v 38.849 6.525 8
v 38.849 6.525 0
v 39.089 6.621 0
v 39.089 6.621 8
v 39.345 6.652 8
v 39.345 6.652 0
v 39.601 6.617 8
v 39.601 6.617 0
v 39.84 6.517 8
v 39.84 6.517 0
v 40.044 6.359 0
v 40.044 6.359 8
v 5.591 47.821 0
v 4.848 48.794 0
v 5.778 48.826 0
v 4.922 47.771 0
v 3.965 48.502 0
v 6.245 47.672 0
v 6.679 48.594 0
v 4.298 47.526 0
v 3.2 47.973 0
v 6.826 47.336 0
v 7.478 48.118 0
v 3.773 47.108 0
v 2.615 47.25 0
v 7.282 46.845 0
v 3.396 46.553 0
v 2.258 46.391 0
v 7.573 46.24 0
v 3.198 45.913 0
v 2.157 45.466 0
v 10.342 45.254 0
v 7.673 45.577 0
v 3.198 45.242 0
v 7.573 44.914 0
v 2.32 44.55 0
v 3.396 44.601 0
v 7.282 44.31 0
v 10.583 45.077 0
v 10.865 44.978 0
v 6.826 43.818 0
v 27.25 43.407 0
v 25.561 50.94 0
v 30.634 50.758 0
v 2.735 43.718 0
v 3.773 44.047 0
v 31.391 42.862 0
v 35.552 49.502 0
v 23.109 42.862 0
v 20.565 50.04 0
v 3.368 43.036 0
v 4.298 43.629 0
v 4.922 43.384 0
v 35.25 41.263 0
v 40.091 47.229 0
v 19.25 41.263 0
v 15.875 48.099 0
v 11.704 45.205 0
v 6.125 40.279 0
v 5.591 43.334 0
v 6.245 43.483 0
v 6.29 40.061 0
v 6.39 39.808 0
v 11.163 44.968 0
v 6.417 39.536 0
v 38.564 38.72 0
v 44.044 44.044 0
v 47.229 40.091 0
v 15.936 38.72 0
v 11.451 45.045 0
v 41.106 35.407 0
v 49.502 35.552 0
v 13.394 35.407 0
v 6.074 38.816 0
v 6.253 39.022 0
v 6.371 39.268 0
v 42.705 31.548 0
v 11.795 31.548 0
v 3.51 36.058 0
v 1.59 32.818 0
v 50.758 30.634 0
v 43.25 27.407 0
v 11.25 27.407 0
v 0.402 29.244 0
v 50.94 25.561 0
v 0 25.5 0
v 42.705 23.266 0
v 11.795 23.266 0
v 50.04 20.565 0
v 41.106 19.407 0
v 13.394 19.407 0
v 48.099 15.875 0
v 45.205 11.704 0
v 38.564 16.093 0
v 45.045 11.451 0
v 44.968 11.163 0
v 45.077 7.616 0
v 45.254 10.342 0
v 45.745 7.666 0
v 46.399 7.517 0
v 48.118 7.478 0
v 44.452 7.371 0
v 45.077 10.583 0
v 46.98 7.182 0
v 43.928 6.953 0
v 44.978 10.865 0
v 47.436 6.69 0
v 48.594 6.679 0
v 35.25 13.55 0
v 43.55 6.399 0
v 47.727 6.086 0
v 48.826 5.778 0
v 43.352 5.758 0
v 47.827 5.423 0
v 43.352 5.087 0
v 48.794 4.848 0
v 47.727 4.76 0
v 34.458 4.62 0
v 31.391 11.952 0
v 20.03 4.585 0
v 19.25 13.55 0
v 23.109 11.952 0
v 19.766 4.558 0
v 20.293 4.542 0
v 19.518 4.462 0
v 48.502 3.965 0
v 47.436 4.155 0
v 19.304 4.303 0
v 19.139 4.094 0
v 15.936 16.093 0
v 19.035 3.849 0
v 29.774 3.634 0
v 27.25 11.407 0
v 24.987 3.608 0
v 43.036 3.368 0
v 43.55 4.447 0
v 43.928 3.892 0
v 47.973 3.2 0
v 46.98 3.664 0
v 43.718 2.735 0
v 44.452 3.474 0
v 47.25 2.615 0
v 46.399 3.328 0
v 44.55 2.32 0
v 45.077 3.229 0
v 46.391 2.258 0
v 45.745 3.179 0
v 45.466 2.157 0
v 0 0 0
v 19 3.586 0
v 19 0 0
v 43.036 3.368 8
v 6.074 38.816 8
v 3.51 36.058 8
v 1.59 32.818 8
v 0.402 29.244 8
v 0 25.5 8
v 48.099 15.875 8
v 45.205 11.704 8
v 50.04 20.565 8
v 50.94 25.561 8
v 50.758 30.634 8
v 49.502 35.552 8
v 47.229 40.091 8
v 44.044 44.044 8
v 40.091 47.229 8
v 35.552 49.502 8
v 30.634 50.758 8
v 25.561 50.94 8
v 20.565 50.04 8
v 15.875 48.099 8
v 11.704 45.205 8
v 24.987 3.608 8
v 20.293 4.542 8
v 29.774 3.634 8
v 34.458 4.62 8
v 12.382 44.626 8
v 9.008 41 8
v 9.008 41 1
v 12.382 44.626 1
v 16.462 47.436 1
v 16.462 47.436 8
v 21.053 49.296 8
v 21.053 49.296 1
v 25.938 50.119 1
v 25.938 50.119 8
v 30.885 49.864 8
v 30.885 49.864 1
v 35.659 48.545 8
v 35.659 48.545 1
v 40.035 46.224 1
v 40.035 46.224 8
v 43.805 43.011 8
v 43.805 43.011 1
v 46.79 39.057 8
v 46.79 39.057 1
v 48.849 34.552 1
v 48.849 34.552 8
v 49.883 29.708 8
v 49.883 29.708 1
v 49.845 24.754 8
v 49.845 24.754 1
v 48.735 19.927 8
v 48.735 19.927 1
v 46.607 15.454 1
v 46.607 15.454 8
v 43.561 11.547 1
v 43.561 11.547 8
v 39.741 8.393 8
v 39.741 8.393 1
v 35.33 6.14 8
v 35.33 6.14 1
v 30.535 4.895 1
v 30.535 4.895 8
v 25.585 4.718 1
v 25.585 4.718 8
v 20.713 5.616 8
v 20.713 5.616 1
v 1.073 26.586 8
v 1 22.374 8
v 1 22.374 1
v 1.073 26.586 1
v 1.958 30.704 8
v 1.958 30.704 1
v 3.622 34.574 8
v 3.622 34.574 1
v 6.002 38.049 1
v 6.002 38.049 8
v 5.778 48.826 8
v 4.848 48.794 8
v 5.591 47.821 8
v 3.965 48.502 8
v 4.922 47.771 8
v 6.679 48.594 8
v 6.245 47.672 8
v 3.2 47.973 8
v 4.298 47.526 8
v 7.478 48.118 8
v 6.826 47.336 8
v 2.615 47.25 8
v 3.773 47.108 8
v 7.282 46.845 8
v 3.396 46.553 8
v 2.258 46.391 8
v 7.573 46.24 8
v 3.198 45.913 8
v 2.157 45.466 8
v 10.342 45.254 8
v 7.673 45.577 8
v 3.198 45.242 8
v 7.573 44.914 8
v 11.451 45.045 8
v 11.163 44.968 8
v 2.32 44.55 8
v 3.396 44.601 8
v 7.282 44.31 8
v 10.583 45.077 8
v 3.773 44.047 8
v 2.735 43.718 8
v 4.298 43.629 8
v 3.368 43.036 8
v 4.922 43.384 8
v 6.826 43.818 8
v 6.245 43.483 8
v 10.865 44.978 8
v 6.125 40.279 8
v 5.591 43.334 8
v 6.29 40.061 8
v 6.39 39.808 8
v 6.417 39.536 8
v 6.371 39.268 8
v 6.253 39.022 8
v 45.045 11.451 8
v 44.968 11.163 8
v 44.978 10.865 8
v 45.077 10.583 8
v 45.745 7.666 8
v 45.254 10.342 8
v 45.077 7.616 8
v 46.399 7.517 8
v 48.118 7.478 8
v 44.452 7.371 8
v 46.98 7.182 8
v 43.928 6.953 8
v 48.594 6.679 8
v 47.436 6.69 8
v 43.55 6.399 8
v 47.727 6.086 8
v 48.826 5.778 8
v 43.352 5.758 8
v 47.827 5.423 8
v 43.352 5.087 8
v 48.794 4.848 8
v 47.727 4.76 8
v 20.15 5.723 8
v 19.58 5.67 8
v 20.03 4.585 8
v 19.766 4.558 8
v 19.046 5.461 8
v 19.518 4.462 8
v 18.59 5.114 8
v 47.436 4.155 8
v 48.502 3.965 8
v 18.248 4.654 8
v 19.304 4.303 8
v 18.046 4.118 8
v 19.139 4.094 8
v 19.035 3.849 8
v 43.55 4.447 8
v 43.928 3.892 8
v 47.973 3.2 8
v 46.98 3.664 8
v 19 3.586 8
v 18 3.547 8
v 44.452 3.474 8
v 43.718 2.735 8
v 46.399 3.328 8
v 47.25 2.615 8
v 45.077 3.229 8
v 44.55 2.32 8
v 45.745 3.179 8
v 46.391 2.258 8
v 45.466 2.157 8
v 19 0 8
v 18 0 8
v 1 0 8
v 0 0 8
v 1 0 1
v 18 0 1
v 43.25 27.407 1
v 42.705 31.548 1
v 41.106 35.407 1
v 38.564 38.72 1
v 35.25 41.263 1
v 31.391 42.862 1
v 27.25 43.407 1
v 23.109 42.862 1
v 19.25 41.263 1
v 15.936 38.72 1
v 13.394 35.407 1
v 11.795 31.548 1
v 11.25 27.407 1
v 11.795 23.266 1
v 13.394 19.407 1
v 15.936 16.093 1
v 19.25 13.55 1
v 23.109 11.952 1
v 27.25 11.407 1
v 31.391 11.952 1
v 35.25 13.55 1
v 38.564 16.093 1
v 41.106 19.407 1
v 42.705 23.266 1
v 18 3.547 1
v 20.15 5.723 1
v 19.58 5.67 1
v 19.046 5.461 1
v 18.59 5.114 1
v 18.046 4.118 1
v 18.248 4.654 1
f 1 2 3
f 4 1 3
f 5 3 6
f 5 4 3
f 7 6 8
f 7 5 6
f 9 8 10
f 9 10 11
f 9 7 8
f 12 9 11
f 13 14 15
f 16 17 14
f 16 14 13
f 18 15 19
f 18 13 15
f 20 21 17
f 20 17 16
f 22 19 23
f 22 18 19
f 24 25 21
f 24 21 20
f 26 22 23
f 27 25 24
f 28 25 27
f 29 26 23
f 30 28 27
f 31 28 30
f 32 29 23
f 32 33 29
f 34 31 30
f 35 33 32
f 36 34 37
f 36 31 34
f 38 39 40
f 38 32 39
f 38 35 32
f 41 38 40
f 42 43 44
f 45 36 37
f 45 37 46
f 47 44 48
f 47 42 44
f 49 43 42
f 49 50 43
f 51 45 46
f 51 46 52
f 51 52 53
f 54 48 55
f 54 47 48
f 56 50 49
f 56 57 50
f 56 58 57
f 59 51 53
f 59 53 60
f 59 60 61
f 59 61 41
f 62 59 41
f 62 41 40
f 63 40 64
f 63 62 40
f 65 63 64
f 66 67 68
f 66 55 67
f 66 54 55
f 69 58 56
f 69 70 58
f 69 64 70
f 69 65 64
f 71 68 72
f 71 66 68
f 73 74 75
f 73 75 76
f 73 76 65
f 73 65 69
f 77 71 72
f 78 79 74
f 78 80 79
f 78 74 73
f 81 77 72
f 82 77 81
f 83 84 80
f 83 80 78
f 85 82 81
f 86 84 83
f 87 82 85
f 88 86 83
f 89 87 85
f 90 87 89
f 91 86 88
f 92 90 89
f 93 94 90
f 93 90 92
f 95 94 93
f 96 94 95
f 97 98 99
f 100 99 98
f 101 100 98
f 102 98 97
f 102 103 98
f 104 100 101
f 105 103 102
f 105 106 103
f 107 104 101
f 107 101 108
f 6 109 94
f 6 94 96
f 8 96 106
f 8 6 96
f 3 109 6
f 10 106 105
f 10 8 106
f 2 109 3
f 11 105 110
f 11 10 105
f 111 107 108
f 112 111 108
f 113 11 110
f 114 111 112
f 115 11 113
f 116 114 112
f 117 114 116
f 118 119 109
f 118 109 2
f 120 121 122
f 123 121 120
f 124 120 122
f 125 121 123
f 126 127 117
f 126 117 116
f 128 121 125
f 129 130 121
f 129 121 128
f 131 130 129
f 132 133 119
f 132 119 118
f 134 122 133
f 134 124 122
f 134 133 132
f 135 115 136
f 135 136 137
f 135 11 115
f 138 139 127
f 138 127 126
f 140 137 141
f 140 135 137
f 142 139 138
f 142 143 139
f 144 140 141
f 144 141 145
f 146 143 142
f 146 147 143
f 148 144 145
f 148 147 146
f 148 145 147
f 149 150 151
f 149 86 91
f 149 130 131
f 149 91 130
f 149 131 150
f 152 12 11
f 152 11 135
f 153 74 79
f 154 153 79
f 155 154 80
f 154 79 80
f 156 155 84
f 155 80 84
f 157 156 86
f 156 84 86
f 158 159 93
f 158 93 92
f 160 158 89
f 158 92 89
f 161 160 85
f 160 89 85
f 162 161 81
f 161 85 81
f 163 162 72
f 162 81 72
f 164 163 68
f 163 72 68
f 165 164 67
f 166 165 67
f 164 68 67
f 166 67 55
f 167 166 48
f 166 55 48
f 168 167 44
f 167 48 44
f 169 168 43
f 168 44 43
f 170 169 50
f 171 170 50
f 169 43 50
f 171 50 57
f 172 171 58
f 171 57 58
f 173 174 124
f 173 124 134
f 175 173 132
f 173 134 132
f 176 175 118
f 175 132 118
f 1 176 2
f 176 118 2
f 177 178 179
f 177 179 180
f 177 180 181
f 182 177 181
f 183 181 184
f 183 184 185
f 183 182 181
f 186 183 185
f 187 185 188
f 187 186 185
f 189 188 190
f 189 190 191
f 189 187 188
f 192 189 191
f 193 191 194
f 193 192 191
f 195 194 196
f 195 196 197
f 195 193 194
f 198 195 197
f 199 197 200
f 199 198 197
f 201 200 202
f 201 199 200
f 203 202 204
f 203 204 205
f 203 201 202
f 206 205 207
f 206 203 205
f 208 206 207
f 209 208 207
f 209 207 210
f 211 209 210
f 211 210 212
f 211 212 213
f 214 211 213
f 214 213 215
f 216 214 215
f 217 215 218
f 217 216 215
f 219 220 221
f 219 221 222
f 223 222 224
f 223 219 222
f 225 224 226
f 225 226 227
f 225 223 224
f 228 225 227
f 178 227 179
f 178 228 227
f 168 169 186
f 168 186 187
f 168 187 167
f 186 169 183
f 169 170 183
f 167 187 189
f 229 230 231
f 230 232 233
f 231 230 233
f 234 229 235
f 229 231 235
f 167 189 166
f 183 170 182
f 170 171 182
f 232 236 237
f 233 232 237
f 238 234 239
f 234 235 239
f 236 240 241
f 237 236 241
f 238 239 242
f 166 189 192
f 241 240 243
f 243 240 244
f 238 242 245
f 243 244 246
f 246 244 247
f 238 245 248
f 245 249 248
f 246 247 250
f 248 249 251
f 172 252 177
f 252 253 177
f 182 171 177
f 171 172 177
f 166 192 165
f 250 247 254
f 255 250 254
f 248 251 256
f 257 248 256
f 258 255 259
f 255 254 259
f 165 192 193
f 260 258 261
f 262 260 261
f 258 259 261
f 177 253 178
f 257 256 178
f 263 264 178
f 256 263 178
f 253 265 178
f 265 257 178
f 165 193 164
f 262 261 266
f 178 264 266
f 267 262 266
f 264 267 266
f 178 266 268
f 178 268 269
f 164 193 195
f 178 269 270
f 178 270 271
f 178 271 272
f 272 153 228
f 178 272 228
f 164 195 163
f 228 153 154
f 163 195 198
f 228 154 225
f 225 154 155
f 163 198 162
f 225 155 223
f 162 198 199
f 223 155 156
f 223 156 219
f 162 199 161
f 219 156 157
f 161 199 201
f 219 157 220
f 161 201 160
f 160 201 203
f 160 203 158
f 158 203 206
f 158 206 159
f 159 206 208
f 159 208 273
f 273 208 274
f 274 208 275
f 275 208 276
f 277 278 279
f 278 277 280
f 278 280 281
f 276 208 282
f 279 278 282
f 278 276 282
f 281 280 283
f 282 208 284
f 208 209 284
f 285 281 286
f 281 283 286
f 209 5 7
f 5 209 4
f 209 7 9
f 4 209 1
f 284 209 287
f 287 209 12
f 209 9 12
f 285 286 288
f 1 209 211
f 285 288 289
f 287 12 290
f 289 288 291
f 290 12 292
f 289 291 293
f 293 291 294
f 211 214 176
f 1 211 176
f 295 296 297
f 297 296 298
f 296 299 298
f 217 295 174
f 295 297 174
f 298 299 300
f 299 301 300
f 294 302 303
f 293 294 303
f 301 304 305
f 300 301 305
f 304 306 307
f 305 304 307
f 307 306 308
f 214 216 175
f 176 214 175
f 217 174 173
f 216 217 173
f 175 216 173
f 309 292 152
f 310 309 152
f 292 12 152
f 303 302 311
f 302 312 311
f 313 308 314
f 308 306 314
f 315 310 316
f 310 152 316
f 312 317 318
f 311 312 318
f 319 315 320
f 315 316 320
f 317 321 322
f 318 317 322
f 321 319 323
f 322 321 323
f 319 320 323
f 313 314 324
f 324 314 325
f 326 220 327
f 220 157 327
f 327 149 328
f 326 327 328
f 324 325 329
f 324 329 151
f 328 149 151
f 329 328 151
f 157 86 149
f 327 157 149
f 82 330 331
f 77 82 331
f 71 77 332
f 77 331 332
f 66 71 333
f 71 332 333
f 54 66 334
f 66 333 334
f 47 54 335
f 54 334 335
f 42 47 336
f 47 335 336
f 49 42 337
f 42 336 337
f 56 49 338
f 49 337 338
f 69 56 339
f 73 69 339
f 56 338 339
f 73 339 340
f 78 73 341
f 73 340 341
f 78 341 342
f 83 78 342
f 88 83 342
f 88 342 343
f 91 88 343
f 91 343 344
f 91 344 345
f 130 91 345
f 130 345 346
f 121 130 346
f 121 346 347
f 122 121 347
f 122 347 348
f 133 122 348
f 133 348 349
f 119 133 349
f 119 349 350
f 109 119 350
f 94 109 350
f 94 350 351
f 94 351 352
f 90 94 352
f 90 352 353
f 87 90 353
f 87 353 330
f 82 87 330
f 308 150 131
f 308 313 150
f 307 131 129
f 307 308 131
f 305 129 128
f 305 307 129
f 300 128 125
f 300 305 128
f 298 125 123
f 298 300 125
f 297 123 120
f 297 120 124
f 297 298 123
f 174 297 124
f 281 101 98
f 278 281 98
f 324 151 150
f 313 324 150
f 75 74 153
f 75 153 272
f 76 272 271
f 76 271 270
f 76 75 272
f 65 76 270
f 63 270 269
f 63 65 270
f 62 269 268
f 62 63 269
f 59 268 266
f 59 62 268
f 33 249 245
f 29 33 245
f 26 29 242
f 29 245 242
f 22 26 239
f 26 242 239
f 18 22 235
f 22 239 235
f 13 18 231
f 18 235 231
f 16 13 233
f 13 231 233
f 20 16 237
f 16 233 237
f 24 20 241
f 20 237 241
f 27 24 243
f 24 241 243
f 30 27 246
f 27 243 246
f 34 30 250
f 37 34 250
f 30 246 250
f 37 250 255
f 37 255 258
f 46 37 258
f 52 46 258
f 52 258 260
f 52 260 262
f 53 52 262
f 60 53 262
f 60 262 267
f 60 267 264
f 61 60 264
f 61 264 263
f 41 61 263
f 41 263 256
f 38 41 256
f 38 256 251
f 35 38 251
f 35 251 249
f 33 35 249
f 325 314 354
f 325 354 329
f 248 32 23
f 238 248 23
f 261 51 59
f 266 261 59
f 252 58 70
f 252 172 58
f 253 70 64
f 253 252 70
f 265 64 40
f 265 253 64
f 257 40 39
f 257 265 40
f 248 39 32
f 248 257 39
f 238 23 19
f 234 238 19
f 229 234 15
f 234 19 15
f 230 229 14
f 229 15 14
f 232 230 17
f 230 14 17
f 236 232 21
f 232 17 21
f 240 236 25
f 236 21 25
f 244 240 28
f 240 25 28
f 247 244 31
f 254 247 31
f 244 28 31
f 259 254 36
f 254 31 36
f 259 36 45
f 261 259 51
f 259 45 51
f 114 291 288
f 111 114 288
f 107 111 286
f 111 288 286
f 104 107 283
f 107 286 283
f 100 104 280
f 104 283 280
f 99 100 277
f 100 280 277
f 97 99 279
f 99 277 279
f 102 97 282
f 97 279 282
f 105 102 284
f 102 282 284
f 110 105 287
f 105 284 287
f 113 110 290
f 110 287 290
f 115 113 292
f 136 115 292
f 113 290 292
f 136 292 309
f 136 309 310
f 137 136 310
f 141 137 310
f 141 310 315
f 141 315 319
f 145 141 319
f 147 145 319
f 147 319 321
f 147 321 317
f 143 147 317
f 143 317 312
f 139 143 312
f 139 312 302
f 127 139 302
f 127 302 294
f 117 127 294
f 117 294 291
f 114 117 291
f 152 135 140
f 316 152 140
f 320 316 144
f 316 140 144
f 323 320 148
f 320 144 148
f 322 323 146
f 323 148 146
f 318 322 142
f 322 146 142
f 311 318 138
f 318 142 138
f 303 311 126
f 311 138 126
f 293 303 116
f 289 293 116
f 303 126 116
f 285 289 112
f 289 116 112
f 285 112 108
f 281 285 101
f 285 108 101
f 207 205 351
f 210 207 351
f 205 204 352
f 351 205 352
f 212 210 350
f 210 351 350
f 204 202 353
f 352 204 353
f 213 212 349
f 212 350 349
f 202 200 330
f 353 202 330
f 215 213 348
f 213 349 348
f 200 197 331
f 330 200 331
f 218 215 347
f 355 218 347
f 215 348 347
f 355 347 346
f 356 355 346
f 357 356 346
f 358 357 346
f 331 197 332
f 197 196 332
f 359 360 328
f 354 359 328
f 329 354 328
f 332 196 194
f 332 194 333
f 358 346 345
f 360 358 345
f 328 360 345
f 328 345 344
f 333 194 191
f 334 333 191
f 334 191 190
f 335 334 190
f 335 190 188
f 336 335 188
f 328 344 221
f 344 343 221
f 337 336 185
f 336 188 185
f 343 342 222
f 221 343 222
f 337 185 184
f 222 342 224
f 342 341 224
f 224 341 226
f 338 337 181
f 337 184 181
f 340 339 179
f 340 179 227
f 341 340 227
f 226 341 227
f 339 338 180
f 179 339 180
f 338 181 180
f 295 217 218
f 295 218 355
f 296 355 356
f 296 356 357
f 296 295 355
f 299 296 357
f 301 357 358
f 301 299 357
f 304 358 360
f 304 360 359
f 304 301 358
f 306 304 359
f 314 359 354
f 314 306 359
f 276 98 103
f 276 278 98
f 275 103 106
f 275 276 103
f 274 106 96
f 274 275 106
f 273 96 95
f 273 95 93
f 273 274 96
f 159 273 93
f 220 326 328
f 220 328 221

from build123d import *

# Parameters (mm, degrees)
BOSS_EXTRUDE1_DEPTH   = 8
FILLET1_R             = 1
FILLET2_R             = 1
FILLET3_R             = 1
CUT_EXTRUDE1_DEPTH    = 7
SKETCH3_R             = 16
CUT_EXTRUDE2_DEPTH    = 7
F_4_0MM_DOWEL_HOLE1_D = 4.5


with BuildPart() as part:
    # Sketch1 → Boss-Extrude1 (new body)
    with BuildSketch(Plane.XY):
        with BuildLine():
            Line((11.013257462, 44.582936616), (7.477723556, 48.118470522))
            ThreePointArc((7.477723556, 48.118470522), (2.881529478, 47.63222476), (3.36777524, 43.036030683))
            Line((3.36777524, 43.036030683), (6.903309146, 39.500496777))
            ThreePointArc((6.903309146, 39.500496777), (6.899494188, 39.494158329), (6.895681204, 39.487818693))
            ThreePointArc((6.895681204, 39.487818693), (1.817587447, 33.297587625), (0, 25.5))
            Line((0, 25.5), (0, 0))
            Line((0, 0), (19, 0))
            Line((19, 0), (19, 4.978942549))
            ThreePointArc((19, 4.978942549), (29.469637429, 3.603949385), (39.500496777, 6.903309146))
            Line((39.500496777, 6.903309146), (43.036030683, 3.36777524))
            ThreePointArc((43.036030683, 3.36777524), (47.63222476, 2.881529478), (48.118470522, 7.477723556))
            Line((48.118470522, 7.477723556), (44.582936616, 11.013257462))
            ThreePointArc((44.582936616, 11.013257462), (44.043786053, 44.043786053), (11.013257462, 44.582936616))
        make_face()
    extrude(amount=BOSS_EXTRUDE1_DEPTH)

    # Fillet1
    # the kernel refuses this fillet: 1 mm, written as the material it adds along each edge
    with BuildSketch(Plane(origin=(6.895681204, 39.487818693, 0), x_dir=(-0.6978515576075072, 0.7162424195373911, 0), z_dir=(0, 0, 1))) as fillet1_piece_1:
        with BuildLine():
            CenterArc((1.091132345, 0.99991544), FILLET1_R, 176.70951396, 94.03559873)
            Line((0.092780983, 1.057313692), (-0.007054153, 1.063053517))
            ThreePointArc((-0.007054153, 1.063053517), (-0.04527045, 0.536700242), (-0.099309015, 0.011735396))
            Line((-0.099309015, 0.011735396), (-0.096713844, -0.025425035))
            ThreePointArc((-0.096713844, -0.025425035), (0.005057841, -0.114302419), (1.105437078, -0.099991544))
            Line((1.105437078, -0.099991544), (1.104136648, 0))
        make_face()
    extrude(amount=8)
    with BuildSketch(Plane(origin=(6.903309146, 39.500496777, 0), x_dir=(-0.7071067811865462, 0.7071067811865487, 0), z_dir=(0, 0, 1))) as fillet1_piece_2:
        with BuildLine():
            CenterArc((1.100472293, 1), FILLET1_R, 175.96440127, 94.03559873)
            Line((0.102951776, 1.070376262), (0.003199724, 1.077413888))
            ThreePointArc((0.003199724, 1.077413888), (-0.102718997, 0.027384376), (-0.097051337, -0.024104732))
            Line((-0.097051337, -0.024104732), (0, -0.1))
            Line((0, -0.1), (1.100472293, -0.1))
            Line((1.100472293, -0.1), (1.100472293, 0))
        make_face()
    extrude(amount=8)

    # Fillet2
    fillet2_edges = [part.edges().sort_by_distance(p)[0] for p in [
        (11.013257462, 44.582936616, 4),
        (44.582936616, 11.013257462, 4),
        (39.500496777, 6.903309146, 4),
    ]]
    fillet(fillet2_edges, radius=FILLET2_R)

    # Fillet3
    fillet3_edges = [part.edges().sort_by_distance(p)[0] for p in [
        (19, 4.978942549, 4),
    ]]
    fillet(fillet3_edges, radius=FILLET3_R)

    # Sketch2 → Cut-Extrude1 (cut)
    with BuildSketch(Plane.XY.offset(8)):
        with BuildLine():
            Line((1, 0), (1, 22.374195455))
            ThreePointArc((1, 22.374195455), (2.695924616, 32.679401027), (9.007717621, 41.000139649))
            ThreePointArc((9.007717621, 41.000139649), (48.848807822, 34.55190705), (20.71331744, 5.616006286))
            ThreePointArc((20.71331744, 5.616006286), (18.805851762, 5.30344249), (18, 3.546534873))
            Line((18, 3.546534873), (18, 0))
            Line((18, 0), (1, 0))
        make_face()
    extrude(amount=-CUT_EXTRUDE1_DEPTH, mode=Mode.SUBTRACT)

    # Sketch3 → Cut-Extrude2 (cut)
    with BuildSketch(Plane.XY.offset(1)):
        with Locations((27.25, 27.406698819)):
            Circle(SKETCH3_R)
    extrude(amount=-CUT_EXTRUDE2_DEPTH, mode=Mode.SUBTRACT)

    # Ø4.0mm Dowel Hole1 (through all)
    with Locations(Plane(origin=(0, 0, 0), x_dir=(-1, 0, 0), z_dir=(0, 0, -1))):
        with Locations((-45.577250602, 5.422749398), (-5.422749398, 45.577250602)):
            Hole(F_4_0MM_DOWEL_HOLE1_D / 2)


solid = part.part
